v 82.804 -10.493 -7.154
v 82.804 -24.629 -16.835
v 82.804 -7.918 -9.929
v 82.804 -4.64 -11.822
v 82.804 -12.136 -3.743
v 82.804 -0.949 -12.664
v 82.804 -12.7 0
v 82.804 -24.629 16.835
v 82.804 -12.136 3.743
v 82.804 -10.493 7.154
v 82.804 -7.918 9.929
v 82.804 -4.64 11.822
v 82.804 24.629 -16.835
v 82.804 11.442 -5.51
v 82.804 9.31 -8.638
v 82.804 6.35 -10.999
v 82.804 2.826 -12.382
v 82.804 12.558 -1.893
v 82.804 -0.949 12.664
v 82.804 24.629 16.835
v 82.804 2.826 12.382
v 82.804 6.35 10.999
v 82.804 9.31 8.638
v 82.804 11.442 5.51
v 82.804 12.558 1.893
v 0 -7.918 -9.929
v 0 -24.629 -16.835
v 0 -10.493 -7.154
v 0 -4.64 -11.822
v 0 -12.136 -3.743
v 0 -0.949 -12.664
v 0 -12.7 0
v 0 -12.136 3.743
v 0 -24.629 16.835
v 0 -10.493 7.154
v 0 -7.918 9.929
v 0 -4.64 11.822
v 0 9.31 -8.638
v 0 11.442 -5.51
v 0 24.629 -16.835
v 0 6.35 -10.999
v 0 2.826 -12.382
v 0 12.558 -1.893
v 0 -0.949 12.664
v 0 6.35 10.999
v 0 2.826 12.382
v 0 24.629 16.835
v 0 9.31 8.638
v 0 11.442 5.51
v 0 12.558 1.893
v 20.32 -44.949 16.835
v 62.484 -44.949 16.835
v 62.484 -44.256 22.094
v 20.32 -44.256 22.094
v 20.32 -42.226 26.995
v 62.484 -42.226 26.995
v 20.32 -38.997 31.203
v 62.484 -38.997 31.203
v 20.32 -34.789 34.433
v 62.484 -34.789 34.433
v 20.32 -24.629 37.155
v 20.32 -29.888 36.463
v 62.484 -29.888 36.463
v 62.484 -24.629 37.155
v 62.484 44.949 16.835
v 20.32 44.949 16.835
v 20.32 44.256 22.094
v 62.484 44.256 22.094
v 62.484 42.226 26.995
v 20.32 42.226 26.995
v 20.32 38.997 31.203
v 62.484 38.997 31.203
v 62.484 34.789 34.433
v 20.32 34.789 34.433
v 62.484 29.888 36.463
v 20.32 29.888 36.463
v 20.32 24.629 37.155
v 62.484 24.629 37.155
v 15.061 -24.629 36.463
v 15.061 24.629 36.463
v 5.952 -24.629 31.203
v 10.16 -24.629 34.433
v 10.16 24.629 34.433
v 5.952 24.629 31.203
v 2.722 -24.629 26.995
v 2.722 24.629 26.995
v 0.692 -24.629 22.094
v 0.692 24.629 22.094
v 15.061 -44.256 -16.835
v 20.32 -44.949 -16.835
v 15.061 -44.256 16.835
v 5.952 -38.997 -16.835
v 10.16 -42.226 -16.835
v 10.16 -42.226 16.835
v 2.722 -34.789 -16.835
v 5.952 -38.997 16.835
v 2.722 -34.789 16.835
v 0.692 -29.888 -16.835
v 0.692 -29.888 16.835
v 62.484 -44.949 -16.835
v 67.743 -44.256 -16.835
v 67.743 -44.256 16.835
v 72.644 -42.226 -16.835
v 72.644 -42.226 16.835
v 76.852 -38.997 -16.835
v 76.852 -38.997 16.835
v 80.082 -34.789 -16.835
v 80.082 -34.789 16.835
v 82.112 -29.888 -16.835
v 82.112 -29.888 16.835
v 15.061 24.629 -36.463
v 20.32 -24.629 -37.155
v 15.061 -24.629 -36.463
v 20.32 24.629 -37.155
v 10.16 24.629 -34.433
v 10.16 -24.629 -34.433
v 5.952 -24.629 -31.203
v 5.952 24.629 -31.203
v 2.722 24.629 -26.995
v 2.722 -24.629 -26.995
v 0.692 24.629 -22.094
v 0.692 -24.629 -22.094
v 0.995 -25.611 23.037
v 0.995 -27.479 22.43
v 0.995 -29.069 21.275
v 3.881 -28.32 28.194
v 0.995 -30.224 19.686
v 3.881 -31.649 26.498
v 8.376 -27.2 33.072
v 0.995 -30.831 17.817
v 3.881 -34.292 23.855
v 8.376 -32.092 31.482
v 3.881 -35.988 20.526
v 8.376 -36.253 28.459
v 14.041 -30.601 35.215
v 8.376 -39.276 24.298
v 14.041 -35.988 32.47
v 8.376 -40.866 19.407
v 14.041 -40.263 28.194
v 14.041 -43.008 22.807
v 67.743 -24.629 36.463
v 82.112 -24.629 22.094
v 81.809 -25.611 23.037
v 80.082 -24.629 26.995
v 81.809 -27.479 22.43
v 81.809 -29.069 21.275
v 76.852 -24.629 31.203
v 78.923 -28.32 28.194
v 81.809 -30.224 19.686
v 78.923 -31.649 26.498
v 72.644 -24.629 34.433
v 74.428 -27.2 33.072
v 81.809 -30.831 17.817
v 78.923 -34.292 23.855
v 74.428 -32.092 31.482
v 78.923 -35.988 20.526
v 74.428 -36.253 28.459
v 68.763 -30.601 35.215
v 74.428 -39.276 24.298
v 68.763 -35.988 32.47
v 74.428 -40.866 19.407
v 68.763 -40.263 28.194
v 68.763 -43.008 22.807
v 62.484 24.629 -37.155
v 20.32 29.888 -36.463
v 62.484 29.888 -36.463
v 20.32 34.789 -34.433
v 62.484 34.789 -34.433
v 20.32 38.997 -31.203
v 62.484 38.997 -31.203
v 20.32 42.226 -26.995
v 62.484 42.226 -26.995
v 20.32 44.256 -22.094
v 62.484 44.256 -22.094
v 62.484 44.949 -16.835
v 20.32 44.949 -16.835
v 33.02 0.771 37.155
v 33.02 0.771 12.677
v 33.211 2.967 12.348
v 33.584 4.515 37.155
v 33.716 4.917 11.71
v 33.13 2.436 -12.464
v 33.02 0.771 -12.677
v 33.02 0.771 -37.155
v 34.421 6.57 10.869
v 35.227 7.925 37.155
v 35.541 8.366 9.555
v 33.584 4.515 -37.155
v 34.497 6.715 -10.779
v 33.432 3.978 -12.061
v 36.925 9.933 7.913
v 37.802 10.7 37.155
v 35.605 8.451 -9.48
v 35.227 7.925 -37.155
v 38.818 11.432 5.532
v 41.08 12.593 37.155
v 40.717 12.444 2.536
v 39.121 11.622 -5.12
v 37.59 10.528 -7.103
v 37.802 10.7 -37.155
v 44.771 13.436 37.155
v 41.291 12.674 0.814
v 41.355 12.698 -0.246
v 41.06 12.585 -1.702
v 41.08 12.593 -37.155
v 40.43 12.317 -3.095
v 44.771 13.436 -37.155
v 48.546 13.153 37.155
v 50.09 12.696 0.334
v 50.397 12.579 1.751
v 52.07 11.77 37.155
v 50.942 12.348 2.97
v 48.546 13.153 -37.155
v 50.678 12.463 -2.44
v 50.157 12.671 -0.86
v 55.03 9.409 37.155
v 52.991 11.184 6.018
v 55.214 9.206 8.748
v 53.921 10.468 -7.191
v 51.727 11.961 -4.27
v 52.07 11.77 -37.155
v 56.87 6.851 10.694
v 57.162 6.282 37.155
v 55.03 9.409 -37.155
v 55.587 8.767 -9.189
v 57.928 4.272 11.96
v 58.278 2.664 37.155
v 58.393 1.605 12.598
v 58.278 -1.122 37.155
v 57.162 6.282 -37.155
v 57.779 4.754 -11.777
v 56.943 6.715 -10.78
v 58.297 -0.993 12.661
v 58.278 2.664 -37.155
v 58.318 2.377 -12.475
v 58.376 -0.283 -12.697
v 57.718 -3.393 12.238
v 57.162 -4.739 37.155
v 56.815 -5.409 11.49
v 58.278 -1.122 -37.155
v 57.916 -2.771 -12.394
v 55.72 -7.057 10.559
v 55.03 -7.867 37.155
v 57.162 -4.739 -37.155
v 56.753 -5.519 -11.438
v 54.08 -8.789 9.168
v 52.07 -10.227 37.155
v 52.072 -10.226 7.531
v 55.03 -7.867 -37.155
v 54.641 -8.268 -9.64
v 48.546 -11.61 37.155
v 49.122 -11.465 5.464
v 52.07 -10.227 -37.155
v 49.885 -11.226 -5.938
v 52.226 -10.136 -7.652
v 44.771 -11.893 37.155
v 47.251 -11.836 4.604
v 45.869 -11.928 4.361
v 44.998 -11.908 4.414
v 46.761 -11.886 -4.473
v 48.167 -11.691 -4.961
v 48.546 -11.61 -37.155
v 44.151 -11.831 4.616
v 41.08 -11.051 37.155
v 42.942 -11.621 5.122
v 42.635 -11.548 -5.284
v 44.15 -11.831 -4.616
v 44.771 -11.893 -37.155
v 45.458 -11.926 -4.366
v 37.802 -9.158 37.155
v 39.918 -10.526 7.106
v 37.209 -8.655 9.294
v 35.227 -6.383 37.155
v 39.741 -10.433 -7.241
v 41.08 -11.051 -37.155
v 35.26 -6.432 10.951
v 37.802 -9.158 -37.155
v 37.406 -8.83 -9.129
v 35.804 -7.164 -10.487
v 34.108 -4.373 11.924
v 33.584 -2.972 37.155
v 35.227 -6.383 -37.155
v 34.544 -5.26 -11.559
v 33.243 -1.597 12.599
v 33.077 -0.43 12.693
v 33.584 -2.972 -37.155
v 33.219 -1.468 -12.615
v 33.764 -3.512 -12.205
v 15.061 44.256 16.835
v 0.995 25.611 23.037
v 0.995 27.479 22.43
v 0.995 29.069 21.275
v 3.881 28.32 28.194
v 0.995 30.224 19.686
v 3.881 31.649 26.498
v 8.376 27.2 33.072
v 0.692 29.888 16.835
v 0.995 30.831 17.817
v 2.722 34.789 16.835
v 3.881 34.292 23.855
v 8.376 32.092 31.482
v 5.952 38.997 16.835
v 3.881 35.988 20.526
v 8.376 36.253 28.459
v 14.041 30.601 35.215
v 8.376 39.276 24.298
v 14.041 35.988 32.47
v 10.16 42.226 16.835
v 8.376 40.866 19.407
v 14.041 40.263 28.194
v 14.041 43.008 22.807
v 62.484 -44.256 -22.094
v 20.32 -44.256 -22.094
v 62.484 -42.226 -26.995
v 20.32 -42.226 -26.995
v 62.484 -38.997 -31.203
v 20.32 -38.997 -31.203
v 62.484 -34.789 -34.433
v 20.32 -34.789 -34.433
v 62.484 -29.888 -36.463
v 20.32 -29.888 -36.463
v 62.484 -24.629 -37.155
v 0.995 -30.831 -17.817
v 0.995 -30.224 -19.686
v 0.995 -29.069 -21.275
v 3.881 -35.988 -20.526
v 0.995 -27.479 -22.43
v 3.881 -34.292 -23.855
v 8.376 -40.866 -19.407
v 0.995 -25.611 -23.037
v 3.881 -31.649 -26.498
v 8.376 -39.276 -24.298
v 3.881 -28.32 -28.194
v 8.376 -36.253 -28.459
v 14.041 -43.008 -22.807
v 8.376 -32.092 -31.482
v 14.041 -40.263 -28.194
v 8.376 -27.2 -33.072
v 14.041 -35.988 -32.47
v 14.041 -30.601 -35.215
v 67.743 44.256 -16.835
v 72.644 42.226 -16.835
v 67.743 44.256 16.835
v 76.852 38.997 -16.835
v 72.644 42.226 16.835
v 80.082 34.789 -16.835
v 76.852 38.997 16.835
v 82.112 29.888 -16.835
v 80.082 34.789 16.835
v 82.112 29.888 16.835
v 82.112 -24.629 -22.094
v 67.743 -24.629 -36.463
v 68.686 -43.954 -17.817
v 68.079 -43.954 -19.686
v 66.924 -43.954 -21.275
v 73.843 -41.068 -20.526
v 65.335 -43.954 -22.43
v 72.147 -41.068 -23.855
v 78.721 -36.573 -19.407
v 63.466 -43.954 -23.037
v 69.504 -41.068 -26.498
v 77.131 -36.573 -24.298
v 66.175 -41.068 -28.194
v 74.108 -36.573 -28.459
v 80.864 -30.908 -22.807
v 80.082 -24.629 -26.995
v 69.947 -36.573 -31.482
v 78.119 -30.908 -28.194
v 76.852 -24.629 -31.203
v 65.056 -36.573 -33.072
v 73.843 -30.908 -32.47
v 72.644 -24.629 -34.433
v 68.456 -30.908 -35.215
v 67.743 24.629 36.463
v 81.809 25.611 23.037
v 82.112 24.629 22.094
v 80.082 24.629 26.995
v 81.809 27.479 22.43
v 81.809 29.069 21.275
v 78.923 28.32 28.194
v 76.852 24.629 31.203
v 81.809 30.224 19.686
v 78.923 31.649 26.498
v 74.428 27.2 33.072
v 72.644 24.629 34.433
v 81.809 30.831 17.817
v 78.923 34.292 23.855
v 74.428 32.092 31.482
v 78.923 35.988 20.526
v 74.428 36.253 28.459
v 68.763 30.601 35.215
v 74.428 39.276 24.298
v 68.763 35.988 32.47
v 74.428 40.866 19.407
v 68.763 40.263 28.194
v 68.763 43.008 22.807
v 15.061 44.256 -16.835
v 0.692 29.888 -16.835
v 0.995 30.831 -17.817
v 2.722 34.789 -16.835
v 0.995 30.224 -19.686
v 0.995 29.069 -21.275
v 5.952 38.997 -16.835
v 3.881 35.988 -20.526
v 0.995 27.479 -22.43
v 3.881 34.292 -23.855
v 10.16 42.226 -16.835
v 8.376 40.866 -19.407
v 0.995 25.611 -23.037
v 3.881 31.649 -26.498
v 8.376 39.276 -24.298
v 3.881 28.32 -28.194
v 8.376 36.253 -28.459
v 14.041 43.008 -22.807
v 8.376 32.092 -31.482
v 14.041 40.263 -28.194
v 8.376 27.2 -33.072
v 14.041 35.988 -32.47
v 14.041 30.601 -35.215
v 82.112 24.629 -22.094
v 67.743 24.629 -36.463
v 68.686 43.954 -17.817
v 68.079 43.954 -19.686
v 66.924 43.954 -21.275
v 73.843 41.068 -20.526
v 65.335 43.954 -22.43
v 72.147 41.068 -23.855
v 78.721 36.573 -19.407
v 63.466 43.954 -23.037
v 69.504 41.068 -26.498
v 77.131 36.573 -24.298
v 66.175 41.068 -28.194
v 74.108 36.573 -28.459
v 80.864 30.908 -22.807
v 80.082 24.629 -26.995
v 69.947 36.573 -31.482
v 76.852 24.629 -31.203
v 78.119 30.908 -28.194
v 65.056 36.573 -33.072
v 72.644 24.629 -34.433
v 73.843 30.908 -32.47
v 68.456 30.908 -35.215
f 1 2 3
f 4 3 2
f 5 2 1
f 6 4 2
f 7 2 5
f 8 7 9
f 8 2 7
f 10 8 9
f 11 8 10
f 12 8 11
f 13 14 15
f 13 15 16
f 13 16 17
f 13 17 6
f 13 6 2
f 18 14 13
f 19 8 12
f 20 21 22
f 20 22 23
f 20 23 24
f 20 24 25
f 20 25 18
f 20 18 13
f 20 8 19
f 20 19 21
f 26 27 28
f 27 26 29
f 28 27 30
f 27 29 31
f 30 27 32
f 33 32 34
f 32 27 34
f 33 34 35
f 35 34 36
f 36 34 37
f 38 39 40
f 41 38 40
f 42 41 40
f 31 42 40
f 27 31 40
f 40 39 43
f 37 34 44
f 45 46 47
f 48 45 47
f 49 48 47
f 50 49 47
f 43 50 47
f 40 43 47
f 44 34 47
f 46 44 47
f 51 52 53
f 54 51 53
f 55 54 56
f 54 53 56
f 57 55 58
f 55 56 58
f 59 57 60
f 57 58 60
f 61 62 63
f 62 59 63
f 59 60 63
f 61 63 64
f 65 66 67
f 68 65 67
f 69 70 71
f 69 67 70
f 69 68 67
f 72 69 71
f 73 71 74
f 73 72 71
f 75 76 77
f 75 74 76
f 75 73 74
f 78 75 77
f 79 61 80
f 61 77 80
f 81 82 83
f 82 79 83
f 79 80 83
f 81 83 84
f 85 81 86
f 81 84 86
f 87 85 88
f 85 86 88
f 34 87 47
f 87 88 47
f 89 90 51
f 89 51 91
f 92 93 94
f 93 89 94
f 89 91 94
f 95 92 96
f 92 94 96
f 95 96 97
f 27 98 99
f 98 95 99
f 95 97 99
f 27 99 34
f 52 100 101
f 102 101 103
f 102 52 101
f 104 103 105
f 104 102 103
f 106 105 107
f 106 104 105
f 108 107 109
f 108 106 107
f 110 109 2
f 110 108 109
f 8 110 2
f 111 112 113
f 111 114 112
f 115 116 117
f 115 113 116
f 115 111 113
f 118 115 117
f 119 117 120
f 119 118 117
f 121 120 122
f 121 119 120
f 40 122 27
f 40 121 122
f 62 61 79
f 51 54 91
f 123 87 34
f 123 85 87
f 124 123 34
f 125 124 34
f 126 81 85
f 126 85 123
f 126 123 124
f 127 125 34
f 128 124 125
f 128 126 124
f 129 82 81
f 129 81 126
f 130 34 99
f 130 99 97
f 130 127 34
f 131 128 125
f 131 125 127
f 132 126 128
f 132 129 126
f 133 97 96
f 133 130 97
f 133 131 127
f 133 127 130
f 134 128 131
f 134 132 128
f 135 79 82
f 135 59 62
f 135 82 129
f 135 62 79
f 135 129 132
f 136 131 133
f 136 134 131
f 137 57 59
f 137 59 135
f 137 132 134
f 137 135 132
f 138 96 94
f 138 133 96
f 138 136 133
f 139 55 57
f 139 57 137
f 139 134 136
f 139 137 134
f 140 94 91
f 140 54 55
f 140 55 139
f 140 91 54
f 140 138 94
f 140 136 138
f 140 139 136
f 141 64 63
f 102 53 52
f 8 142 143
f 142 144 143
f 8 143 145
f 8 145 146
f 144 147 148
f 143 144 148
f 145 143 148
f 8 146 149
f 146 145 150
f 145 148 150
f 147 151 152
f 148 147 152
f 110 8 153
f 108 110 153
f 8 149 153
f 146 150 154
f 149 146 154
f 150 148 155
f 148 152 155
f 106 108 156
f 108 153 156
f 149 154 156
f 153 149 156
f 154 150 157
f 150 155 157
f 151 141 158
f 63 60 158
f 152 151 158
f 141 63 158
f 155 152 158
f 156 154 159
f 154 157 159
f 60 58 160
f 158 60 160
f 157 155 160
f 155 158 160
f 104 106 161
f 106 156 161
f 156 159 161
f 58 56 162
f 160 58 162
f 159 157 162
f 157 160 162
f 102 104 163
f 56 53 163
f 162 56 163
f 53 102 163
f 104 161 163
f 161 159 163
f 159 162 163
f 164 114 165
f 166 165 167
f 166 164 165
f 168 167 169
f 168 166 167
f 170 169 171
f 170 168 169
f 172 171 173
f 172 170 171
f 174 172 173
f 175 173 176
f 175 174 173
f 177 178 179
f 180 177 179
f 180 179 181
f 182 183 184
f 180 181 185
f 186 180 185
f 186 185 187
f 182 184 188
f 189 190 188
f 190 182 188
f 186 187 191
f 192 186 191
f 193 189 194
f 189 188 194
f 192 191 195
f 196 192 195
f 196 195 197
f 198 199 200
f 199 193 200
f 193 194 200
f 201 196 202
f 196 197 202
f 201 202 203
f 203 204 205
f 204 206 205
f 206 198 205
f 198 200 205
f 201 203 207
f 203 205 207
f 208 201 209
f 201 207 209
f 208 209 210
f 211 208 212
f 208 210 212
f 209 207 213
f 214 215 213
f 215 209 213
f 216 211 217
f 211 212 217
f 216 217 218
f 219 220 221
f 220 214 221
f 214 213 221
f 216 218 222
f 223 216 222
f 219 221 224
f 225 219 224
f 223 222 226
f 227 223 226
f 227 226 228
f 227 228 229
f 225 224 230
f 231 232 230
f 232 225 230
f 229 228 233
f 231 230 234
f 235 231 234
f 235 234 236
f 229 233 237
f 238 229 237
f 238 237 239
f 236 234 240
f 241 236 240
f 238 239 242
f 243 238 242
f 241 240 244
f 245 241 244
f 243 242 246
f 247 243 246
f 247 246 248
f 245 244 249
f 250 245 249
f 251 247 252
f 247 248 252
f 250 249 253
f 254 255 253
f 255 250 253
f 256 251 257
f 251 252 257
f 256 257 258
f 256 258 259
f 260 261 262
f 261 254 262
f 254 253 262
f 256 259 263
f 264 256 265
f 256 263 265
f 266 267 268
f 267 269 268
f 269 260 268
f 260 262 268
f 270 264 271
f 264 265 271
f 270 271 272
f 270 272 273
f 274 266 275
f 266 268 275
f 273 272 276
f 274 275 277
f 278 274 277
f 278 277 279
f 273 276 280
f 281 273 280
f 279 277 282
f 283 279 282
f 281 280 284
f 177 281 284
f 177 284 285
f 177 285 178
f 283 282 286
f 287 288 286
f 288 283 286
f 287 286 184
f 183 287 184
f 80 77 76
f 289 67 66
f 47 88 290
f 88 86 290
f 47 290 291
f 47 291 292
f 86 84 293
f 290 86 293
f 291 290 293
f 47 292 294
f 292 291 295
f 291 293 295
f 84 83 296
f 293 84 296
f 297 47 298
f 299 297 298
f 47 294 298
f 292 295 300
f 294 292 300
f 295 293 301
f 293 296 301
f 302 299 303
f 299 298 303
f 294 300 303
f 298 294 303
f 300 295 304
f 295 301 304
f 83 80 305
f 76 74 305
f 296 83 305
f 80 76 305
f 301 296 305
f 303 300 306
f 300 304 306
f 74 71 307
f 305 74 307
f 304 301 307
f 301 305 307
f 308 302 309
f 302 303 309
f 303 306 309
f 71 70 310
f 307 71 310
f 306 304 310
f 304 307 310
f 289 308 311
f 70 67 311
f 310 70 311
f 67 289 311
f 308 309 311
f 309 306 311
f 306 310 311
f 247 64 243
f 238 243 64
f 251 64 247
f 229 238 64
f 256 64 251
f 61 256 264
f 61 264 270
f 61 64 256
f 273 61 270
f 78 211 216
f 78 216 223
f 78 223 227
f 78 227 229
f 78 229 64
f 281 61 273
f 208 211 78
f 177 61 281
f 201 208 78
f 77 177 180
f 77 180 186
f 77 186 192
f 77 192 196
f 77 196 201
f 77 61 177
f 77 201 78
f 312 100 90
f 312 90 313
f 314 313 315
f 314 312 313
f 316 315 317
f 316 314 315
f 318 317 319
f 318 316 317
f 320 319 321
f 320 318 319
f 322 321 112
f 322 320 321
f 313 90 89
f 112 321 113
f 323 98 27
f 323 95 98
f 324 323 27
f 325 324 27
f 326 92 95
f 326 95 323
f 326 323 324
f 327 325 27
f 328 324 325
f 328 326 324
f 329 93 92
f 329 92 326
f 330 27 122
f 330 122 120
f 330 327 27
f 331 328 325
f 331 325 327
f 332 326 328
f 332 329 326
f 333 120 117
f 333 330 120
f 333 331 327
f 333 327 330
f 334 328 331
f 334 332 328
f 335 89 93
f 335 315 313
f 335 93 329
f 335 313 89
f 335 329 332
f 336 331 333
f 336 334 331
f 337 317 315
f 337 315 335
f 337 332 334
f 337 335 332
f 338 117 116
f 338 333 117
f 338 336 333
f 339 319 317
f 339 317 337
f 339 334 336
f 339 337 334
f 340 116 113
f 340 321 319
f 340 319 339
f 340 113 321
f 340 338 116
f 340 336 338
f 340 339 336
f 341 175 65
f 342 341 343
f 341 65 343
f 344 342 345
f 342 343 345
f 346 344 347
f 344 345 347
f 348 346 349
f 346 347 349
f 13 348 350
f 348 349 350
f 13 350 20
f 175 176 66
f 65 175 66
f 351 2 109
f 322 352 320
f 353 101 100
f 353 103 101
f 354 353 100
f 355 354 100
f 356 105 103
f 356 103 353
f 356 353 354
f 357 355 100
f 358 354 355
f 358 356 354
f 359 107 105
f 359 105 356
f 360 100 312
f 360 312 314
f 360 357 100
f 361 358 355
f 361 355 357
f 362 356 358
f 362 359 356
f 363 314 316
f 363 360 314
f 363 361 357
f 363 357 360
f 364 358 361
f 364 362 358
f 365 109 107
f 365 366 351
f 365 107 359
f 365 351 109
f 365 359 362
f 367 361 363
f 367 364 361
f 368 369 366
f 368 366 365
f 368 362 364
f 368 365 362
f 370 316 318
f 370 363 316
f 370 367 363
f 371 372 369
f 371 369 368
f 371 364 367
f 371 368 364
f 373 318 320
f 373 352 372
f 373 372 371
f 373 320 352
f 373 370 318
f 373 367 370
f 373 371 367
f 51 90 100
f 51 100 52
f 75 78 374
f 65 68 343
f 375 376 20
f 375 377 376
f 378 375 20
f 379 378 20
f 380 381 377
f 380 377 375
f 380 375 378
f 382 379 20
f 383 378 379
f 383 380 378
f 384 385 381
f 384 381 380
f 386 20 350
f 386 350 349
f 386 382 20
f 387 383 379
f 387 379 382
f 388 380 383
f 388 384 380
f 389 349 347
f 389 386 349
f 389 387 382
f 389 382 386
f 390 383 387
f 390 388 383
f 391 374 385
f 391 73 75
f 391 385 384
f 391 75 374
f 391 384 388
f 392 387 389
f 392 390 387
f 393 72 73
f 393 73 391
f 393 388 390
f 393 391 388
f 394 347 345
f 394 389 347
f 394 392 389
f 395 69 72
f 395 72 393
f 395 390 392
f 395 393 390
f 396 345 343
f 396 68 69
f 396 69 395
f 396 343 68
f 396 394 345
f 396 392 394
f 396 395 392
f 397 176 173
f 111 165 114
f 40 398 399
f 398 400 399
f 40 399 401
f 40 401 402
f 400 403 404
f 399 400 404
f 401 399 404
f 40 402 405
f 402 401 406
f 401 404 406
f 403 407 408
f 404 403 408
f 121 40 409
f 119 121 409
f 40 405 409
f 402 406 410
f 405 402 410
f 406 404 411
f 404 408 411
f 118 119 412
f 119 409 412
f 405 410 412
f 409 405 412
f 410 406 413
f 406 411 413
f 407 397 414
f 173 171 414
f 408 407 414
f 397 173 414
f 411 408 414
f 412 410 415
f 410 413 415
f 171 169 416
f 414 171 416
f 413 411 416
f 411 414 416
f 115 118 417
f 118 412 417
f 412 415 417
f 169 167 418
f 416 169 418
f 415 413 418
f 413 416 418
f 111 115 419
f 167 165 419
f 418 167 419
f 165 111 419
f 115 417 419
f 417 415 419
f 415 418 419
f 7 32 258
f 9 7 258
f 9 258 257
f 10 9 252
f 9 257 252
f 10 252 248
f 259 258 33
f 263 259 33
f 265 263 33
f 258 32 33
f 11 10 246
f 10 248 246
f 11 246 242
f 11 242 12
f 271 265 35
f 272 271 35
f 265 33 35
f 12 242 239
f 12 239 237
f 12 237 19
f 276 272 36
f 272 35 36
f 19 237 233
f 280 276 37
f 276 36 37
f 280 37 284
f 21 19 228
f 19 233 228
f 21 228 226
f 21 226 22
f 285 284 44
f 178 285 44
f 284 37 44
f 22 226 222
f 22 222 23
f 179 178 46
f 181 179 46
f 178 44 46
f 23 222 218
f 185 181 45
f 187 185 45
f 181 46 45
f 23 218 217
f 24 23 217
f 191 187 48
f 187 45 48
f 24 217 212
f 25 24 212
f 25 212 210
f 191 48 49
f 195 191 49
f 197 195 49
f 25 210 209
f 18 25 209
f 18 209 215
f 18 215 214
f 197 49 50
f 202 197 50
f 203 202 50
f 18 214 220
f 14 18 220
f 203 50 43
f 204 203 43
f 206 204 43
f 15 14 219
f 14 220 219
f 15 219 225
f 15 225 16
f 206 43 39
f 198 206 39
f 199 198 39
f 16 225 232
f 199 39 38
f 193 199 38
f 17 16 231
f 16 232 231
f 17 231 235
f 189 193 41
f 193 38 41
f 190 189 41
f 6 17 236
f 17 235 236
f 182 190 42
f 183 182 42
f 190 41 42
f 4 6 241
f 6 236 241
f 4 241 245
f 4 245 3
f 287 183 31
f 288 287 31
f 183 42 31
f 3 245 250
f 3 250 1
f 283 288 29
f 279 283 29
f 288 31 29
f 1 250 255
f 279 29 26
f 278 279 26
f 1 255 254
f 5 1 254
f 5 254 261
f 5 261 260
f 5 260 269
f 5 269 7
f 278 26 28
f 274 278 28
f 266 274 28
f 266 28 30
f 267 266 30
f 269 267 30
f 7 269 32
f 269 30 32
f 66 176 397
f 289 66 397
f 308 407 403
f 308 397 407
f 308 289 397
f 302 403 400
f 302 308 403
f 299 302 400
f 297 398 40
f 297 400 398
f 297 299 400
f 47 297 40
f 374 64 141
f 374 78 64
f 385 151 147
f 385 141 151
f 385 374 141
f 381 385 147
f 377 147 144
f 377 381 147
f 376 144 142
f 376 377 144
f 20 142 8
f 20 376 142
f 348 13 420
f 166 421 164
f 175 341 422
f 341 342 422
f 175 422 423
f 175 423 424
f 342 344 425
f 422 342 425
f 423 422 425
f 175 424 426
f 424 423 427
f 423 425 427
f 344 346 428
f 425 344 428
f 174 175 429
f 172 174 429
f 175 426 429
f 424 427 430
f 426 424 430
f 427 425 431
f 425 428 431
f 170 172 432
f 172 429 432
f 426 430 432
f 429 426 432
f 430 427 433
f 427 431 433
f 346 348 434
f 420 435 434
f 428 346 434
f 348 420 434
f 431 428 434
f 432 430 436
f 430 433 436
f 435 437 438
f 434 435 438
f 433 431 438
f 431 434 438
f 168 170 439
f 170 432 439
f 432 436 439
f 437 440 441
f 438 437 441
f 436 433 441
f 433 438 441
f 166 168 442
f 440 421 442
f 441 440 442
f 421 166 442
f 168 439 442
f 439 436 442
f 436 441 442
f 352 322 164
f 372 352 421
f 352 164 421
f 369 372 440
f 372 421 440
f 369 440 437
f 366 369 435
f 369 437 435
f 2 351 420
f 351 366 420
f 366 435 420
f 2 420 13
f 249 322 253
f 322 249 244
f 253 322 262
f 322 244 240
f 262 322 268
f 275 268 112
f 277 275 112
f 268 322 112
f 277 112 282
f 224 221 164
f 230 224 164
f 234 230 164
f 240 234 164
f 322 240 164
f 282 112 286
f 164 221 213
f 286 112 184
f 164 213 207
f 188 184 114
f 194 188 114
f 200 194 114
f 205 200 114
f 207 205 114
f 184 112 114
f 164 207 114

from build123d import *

# Parameters (mm, degrees)
F0_W     = 89.89758
F0_H     = 74.309834
F1_DEPTH = 82.804
F2_R     = 20.32
F4_D     = 25.4
F6_D     = 25.4


with BuildPart() as f1:
    # F0 (on Right) → F1 (new body)
    with BuildSketch(Plane.YZ):
        Rectangle(F0_W, F0_H)
    extrude(amount=F1_DEPTH)

    # F2
    f2_edges = [f1.edges().sort_by_distance(p)[0] for p in [
        (41.402, 44.94879, 37.154917),
        (41.402, -44.94879, 37.154917),
        (0, 0, 37.154917),
        (82.804, 0, 37.154917),
        (82.804, 0, -37.154917),
        (82.804, 44.94879, 0),
        (82.804, -44.94879, 0),
        (41.402, -44.94879, -37.154917),
        (0, -44.94879, 0),
        (41.402, 44.94879, -37.154917),
        (0, 44.94879, 0),
        (0, 0, -37.154917),
    ]]
    fillet(f2_edges, radius=F2_R)

    # F4 (through all)
    with Locations(Plane.XY.offset(37.154917)):
        with Locations((45.72, 0.77121)):
            Hole(F4_D / 2)

    # F6 (through all)
    with Locations(Plane.YZ.offset(82.804)):
        with Locations((0, 0)):
            Hole(F6_D / 2)


solid = f1.part
